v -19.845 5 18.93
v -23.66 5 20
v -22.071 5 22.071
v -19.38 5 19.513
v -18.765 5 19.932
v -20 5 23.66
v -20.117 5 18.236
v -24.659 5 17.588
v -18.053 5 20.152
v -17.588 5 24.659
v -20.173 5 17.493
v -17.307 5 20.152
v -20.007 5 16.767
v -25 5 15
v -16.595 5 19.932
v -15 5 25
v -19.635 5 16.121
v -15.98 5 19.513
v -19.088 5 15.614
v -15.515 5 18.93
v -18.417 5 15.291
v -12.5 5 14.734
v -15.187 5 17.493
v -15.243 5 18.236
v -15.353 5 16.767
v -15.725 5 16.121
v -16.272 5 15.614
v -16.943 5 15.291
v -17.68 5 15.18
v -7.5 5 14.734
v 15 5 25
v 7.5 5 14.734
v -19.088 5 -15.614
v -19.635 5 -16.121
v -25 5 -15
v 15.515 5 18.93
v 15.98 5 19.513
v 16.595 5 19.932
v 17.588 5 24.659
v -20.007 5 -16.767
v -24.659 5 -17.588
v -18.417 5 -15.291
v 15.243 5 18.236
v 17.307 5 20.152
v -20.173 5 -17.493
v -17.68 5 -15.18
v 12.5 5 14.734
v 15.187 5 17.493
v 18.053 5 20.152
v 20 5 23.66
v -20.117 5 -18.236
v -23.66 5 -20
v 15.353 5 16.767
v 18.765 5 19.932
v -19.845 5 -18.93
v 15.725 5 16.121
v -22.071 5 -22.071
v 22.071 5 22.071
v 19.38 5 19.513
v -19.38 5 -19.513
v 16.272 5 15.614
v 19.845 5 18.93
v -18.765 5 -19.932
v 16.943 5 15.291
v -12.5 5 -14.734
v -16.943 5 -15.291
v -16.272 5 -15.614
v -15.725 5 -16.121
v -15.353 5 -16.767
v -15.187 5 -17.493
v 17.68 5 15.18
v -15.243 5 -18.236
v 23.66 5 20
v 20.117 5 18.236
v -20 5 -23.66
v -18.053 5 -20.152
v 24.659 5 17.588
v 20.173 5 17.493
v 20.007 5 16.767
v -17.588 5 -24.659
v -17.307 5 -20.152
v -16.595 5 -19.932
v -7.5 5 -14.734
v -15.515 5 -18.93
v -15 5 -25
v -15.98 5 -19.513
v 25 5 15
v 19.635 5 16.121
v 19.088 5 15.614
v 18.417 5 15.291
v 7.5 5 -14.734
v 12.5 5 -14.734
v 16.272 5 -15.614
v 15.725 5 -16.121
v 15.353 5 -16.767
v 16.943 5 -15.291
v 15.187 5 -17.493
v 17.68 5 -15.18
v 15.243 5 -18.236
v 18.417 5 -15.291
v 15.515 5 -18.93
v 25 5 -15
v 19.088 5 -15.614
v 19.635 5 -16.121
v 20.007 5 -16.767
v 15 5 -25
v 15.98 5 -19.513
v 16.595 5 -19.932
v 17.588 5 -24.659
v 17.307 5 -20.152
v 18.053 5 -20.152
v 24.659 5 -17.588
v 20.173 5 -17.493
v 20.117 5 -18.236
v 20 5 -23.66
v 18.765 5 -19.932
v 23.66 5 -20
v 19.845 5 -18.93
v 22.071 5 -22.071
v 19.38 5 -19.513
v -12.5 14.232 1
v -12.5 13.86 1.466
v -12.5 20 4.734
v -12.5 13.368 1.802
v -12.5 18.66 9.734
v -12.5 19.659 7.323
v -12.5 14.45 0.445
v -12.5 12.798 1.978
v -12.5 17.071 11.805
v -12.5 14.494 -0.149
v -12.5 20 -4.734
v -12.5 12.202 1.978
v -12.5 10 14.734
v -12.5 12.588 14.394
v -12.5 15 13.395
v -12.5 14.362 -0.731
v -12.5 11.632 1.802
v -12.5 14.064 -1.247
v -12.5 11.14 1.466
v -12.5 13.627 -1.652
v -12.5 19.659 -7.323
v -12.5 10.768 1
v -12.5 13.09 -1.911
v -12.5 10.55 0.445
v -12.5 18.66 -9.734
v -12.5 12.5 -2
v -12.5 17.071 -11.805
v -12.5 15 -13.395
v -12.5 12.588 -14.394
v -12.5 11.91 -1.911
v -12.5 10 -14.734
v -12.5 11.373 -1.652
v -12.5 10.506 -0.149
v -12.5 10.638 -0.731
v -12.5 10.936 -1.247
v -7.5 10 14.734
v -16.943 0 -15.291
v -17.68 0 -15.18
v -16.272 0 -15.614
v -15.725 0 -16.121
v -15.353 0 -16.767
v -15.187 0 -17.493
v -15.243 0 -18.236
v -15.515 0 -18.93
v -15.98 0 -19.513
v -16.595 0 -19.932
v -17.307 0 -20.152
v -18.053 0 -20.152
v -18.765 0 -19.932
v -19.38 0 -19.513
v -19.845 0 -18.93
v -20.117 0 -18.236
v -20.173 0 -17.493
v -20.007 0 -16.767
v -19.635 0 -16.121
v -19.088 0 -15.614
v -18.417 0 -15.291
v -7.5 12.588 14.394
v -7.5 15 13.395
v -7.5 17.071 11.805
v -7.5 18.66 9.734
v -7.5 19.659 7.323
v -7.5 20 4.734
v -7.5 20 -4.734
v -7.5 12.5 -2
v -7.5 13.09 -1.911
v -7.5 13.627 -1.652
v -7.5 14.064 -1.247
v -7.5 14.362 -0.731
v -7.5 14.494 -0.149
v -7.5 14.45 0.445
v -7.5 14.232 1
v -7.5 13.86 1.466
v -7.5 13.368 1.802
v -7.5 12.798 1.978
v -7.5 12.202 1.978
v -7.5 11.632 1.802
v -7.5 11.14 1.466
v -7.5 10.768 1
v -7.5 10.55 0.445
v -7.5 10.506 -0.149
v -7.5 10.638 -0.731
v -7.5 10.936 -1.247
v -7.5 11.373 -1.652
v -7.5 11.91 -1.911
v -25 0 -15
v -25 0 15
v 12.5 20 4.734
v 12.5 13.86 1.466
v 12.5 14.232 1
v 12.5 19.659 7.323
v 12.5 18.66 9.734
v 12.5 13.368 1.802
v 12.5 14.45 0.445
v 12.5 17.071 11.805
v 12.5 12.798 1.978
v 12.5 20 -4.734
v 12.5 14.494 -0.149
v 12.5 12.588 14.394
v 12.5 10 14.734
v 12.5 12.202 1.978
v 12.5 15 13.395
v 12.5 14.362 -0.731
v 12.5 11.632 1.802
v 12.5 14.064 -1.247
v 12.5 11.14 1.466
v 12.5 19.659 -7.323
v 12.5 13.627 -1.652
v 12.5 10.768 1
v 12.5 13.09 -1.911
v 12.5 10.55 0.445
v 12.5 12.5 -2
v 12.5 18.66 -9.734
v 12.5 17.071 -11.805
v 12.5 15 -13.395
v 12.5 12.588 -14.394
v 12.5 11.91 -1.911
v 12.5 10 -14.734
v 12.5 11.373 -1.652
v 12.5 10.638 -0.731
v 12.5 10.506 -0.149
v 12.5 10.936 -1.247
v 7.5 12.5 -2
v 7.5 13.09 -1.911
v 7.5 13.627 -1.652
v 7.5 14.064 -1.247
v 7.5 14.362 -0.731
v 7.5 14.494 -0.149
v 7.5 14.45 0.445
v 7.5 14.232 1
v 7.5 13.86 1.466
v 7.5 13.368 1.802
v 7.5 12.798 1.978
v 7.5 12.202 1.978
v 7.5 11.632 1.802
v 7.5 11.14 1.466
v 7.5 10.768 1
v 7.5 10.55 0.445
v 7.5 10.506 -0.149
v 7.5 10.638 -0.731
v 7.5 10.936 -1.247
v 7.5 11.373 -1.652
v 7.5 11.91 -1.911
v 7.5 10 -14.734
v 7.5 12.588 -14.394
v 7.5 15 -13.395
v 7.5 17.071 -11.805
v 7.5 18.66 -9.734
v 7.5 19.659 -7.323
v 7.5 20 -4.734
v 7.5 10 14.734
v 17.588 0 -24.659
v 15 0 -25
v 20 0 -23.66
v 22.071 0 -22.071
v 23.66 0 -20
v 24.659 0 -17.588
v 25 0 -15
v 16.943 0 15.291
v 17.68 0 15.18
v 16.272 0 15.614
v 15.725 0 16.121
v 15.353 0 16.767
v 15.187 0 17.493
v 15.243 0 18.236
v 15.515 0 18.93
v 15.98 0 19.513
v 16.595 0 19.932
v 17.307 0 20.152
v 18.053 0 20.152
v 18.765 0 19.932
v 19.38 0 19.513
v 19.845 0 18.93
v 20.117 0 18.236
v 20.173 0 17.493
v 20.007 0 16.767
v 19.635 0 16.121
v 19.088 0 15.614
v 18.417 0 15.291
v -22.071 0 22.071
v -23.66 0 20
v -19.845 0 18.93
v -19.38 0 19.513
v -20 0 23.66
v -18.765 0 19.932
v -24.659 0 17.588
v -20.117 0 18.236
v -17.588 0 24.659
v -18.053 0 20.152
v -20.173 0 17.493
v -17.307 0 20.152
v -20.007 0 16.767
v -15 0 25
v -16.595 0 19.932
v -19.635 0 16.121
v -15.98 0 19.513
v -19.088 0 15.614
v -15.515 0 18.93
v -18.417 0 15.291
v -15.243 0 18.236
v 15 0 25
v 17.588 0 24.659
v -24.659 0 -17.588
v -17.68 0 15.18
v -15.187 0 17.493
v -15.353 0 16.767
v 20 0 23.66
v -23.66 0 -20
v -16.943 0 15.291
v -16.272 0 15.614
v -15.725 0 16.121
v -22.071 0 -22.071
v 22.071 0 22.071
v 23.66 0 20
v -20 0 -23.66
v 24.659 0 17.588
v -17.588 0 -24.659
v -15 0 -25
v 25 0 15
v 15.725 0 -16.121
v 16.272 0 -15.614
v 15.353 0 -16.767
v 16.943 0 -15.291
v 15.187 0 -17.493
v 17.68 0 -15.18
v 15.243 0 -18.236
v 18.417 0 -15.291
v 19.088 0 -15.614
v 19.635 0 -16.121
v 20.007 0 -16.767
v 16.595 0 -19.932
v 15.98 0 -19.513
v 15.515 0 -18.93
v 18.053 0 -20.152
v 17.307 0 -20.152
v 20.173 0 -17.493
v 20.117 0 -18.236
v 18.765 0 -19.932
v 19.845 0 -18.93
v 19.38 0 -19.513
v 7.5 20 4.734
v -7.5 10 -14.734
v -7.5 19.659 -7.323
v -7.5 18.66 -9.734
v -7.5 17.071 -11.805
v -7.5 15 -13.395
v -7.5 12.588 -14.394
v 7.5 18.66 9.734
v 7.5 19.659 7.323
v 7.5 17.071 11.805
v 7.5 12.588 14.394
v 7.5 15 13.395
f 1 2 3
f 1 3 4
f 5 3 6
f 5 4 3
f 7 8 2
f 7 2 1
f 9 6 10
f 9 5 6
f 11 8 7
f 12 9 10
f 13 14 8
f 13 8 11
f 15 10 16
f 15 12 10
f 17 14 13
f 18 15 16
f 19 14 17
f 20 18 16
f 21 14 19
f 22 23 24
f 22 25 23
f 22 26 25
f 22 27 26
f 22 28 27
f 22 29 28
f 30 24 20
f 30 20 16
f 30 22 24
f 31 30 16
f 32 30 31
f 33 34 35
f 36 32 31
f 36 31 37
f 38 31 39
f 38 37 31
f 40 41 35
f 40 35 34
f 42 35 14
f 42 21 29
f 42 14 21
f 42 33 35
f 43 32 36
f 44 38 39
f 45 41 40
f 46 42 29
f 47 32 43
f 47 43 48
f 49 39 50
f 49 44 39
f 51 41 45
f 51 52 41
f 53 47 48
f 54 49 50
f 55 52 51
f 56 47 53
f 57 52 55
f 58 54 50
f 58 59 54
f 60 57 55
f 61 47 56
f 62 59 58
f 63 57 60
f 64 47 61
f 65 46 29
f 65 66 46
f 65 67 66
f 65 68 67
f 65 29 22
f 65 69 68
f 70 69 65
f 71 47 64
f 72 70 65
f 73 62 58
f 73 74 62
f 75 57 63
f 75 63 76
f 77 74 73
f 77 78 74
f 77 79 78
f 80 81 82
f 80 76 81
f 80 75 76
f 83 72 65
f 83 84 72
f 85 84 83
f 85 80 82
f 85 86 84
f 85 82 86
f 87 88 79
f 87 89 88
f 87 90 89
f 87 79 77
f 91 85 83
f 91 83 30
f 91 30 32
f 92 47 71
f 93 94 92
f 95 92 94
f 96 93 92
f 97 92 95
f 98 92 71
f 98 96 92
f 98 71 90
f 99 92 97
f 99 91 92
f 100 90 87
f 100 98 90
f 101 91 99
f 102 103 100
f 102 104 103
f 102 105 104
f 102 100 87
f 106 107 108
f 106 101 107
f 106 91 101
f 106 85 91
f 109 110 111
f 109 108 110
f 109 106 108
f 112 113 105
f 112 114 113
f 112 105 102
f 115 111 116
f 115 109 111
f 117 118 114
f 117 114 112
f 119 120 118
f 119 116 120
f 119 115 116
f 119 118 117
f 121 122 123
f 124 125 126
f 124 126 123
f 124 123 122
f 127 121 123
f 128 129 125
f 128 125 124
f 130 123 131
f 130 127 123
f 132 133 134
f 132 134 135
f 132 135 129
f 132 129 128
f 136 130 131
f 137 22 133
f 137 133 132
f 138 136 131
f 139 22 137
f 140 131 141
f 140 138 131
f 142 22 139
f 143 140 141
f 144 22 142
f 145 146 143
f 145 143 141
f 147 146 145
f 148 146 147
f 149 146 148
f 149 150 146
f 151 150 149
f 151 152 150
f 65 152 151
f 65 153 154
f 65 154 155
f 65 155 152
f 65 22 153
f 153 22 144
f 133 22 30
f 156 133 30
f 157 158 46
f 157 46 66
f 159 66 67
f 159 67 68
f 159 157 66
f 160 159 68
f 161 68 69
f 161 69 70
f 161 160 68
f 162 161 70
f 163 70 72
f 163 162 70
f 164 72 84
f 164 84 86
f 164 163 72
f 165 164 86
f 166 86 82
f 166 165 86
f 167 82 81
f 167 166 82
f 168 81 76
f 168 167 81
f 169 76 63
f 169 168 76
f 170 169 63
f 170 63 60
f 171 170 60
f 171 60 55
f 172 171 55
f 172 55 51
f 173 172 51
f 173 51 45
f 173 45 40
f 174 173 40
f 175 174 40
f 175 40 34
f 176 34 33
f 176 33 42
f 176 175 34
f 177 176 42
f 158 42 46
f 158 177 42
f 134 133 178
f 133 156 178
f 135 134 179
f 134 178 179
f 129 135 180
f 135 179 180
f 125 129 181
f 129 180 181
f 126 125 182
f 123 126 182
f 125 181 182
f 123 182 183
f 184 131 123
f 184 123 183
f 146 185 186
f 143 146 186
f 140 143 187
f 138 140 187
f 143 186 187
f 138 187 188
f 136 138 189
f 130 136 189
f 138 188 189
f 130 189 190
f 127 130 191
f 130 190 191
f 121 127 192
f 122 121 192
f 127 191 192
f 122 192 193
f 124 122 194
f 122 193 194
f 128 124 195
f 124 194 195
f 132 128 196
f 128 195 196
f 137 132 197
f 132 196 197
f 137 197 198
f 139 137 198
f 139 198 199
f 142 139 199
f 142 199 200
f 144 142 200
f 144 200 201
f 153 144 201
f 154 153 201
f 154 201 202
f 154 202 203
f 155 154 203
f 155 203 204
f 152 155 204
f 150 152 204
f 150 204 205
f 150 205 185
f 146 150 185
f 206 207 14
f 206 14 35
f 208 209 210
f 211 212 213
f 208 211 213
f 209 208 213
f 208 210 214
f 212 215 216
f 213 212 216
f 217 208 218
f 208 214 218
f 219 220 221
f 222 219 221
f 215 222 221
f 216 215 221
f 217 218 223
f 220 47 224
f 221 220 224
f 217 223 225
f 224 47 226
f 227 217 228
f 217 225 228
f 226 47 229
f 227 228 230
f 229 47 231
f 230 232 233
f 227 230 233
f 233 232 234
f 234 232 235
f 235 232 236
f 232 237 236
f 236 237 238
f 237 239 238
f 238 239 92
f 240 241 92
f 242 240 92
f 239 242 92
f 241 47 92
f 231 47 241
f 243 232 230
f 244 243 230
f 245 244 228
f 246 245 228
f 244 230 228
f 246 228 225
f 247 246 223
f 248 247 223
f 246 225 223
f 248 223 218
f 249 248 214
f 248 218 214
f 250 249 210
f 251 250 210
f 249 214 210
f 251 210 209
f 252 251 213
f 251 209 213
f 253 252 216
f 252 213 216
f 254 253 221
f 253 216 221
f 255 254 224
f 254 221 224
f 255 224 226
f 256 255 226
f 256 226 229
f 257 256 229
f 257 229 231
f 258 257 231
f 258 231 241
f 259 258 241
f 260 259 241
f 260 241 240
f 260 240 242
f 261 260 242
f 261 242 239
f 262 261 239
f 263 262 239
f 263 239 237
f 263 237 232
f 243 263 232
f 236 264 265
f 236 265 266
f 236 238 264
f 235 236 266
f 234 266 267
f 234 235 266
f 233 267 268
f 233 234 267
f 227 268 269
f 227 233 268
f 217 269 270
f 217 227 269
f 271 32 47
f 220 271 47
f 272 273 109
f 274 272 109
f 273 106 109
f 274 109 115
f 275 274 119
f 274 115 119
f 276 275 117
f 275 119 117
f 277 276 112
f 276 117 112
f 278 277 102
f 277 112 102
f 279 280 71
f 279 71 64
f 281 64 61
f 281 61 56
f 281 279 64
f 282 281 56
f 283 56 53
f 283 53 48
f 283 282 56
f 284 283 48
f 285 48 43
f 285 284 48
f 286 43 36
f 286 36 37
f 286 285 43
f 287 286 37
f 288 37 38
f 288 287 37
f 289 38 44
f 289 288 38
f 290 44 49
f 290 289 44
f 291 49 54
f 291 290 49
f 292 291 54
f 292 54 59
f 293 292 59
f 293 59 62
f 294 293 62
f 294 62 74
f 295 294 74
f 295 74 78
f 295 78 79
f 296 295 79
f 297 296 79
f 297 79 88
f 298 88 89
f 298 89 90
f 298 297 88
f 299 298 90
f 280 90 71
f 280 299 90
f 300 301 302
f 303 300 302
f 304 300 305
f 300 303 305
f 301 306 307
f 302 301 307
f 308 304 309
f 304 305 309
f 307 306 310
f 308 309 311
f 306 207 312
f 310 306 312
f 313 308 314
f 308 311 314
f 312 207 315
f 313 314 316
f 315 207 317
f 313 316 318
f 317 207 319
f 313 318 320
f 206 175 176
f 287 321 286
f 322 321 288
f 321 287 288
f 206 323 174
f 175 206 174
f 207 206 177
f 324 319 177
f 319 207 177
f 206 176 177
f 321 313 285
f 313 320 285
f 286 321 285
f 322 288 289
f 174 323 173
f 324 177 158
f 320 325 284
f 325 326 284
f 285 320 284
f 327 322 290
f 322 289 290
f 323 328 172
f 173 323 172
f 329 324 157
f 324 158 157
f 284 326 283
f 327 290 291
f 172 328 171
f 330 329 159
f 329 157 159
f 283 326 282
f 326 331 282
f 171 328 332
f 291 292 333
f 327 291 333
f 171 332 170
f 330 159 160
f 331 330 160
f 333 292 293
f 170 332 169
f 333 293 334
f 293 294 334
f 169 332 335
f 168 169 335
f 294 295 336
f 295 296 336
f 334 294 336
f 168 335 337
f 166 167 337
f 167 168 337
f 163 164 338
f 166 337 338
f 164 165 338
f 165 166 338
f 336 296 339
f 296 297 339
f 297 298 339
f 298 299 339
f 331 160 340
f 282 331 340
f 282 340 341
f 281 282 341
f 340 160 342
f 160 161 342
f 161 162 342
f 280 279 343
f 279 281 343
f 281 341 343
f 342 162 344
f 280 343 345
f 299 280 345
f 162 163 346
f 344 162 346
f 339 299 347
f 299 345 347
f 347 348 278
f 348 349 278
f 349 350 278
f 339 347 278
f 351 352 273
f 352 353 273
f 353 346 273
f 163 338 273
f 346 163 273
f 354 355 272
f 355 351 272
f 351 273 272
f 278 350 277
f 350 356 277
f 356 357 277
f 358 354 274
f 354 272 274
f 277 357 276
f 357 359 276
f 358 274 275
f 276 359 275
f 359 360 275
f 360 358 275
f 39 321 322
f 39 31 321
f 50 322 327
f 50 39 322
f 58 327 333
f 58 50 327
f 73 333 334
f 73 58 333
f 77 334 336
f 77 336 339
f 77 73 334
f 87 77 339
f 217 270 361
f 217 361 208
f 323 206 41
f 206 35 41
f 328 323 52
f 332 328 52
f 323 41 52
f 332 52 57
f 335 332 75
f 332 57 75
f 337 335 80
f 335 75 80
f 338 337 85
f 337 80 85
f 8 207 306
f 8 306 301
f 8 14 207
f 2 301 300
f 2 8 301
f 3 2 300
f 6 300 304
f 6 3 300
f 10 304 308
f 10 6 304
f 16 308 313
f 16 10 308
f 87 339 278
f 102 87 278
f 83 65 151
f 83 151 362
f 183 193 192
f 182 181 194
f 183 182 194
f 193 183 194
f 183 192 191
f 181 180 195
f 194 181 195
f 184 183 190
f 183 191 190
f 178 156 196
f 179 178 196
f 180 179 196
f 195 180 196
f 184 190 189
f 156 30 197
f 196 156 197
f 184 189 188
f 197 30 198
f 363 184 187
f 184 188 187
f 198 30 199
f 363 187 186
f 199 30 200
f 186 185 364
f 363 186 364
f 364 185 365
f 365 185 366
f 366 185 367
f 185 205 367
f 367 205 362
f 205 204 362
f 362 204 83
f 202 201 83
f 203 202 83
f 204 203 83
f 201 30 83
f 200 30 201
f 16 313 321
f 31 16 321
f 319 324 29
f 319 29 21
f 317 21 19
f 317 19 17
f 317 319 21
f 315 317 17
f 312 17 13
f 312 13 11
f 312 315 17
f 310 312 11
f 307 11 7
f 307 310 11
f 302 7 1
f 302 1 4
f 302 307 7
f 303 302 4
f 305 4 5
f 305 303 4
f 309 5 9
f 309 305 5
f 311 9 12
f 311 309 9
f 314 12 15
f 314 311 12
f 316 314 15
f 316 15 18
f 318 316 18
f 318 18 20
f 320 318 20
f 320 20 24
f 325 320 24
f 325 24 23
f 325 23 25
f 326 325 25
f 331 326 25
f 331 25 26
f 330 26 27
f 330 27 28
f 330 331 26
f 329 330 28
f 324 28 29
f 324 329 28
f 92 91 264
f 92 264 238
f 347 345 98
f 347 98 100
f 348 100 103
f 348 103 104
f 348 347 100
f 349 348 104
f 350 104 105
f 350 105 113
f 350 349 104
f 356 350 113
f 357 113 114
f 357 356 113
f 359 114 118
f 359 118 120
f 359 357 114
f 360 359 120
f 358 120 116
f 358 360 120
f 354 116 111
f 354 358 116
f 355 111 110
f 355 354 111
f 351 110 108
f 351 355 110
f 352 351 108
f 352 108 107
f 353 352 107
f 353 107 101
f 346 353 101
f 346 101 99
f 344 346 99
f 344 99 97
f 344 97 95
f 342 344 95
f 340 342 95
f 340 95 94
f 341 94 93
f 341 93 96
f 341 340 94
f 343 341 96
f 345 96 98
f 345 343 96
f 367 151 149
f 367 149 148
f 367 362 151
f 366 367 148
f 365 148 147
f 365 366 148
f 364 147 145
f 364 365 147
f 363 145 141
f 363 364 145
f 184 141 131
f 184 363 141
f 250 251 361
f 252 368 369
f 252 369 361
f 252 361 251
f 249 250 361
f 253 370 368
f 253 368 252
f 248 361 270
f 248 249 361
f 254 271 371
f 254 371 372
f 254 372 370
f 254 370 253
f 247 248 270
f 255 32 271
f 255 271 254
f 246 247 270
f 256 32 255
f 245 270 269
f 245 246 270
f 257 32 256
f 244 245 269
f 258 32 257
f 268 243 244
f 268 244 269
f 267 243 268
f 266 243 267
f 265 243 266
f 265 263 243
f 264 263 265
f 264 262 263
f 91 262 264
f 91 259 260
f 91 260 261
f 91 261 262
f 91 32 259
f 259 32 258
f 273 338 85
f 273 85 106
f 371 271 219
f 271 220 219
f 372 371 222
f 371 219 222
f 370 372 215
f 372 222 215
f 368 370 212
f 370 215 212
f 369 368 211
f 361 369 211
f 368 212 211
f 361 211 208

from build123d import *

# Parameters (mm, degrees)
SKETCH1_W           = 50
SKETCH1_H           = 50
SKETCH1_R           = 2.5
BOSS_EXTRUDE1_DEPTH = 5
SKETCH2_W           = 5
SKETCH2_H           = 29.468657126
BOSS_EXTRUDE2_DEPTH = 15
SKETCH3_R           = 2
CUT_EXTRUDE1_DEPTH  = 50.307707308
FILLET1_R           = 10
FILLET2_R           = 10


with BuildPart() as part:
    # Sketch1 → Boss-Extrude1 (new body)
    with BuildSketch(Plane(origin=(0, 0, 0), x_dir=(1, 0, 0), z_dir=(0, 1, 0))):
        Rectangle(SKETCH1_W, SKETCH1_H)
        with Locations(Location((-17.68, 17.68, 0), (0, 0, 270))):
            Circle(SKETCH1_R, mode=Mode.SUBTRACT)
        with Locations(Location((17.68, 17.68, 0), (0, 0, 270))):
            Circle(SKETCH1_R, mode=Mode.SUBTRACT)
        with Locations(Location((17.68, -17.68, 0), (0, 0, 90))):
            Circle(SKETCH1_R, mode=Mode.SUBTRACT)
        with Locations(Location((-17.68, -17.68, 0), (0, 0, 90))):
            Circle(SKETCH1_R, mode=Mode.SUBTRACT)
    extrude(amount=BOSS_EXTRUDE1_DEPTH)

    # Sketch2 → Boss-Extrude2 (add)
    with BuildSketch(Plane(origin=(0, 5, 0), x_dir=(1, 0, 0), z_dir=(0, 1, 0))):
        with Locations((-10, 0)):
            Rectangle(SKETCH2_W, SKETCH2_H)
        with Locations((10, 0)):
            Rectangle(SKETCH2_W, SKETCH2_H)
    extrude(amount=BOSS_EXTRUDE2_DEPTH)

    # Sketch3 → Cut-Extrude1 (cut, through all)
    with BuildSketch(Plane(origin=(12.5, 0, 0), x_dir=(0, 0, -1), z_dir=(1, 0, 0))):
        with Locations((0, 12.5)):
            Circle(SKETCH3_R)
    extrude(amount=-CUT_EXTRUDE1_DEPTH, mode=Mode.SUBTRACT)

    # Fillet1
    fillet1_edges = [part.edges().sort_by_distance(p)[0] for p in [
        (-10, 20, -14.734328563),
        (-10, 20, 14.734328563),
        (10, 20, -14.734328563),
        (10, 20, 14.734328563),
    ]]
    fillet(fillet1_edges, radius=FILLET1_R)

    # Fillet2
    fillet2_edges = [part.edges().sort_by_distance(p)[0] for p in [
        (25, 2.5, 25),
        (-25, 2.5, 25),
        (-25, 2.5, -25),
        (25, 2.5, -25),
    ]]
    fillet(fillet2_edges, radius=FILLET2_R)


solid = part.part
